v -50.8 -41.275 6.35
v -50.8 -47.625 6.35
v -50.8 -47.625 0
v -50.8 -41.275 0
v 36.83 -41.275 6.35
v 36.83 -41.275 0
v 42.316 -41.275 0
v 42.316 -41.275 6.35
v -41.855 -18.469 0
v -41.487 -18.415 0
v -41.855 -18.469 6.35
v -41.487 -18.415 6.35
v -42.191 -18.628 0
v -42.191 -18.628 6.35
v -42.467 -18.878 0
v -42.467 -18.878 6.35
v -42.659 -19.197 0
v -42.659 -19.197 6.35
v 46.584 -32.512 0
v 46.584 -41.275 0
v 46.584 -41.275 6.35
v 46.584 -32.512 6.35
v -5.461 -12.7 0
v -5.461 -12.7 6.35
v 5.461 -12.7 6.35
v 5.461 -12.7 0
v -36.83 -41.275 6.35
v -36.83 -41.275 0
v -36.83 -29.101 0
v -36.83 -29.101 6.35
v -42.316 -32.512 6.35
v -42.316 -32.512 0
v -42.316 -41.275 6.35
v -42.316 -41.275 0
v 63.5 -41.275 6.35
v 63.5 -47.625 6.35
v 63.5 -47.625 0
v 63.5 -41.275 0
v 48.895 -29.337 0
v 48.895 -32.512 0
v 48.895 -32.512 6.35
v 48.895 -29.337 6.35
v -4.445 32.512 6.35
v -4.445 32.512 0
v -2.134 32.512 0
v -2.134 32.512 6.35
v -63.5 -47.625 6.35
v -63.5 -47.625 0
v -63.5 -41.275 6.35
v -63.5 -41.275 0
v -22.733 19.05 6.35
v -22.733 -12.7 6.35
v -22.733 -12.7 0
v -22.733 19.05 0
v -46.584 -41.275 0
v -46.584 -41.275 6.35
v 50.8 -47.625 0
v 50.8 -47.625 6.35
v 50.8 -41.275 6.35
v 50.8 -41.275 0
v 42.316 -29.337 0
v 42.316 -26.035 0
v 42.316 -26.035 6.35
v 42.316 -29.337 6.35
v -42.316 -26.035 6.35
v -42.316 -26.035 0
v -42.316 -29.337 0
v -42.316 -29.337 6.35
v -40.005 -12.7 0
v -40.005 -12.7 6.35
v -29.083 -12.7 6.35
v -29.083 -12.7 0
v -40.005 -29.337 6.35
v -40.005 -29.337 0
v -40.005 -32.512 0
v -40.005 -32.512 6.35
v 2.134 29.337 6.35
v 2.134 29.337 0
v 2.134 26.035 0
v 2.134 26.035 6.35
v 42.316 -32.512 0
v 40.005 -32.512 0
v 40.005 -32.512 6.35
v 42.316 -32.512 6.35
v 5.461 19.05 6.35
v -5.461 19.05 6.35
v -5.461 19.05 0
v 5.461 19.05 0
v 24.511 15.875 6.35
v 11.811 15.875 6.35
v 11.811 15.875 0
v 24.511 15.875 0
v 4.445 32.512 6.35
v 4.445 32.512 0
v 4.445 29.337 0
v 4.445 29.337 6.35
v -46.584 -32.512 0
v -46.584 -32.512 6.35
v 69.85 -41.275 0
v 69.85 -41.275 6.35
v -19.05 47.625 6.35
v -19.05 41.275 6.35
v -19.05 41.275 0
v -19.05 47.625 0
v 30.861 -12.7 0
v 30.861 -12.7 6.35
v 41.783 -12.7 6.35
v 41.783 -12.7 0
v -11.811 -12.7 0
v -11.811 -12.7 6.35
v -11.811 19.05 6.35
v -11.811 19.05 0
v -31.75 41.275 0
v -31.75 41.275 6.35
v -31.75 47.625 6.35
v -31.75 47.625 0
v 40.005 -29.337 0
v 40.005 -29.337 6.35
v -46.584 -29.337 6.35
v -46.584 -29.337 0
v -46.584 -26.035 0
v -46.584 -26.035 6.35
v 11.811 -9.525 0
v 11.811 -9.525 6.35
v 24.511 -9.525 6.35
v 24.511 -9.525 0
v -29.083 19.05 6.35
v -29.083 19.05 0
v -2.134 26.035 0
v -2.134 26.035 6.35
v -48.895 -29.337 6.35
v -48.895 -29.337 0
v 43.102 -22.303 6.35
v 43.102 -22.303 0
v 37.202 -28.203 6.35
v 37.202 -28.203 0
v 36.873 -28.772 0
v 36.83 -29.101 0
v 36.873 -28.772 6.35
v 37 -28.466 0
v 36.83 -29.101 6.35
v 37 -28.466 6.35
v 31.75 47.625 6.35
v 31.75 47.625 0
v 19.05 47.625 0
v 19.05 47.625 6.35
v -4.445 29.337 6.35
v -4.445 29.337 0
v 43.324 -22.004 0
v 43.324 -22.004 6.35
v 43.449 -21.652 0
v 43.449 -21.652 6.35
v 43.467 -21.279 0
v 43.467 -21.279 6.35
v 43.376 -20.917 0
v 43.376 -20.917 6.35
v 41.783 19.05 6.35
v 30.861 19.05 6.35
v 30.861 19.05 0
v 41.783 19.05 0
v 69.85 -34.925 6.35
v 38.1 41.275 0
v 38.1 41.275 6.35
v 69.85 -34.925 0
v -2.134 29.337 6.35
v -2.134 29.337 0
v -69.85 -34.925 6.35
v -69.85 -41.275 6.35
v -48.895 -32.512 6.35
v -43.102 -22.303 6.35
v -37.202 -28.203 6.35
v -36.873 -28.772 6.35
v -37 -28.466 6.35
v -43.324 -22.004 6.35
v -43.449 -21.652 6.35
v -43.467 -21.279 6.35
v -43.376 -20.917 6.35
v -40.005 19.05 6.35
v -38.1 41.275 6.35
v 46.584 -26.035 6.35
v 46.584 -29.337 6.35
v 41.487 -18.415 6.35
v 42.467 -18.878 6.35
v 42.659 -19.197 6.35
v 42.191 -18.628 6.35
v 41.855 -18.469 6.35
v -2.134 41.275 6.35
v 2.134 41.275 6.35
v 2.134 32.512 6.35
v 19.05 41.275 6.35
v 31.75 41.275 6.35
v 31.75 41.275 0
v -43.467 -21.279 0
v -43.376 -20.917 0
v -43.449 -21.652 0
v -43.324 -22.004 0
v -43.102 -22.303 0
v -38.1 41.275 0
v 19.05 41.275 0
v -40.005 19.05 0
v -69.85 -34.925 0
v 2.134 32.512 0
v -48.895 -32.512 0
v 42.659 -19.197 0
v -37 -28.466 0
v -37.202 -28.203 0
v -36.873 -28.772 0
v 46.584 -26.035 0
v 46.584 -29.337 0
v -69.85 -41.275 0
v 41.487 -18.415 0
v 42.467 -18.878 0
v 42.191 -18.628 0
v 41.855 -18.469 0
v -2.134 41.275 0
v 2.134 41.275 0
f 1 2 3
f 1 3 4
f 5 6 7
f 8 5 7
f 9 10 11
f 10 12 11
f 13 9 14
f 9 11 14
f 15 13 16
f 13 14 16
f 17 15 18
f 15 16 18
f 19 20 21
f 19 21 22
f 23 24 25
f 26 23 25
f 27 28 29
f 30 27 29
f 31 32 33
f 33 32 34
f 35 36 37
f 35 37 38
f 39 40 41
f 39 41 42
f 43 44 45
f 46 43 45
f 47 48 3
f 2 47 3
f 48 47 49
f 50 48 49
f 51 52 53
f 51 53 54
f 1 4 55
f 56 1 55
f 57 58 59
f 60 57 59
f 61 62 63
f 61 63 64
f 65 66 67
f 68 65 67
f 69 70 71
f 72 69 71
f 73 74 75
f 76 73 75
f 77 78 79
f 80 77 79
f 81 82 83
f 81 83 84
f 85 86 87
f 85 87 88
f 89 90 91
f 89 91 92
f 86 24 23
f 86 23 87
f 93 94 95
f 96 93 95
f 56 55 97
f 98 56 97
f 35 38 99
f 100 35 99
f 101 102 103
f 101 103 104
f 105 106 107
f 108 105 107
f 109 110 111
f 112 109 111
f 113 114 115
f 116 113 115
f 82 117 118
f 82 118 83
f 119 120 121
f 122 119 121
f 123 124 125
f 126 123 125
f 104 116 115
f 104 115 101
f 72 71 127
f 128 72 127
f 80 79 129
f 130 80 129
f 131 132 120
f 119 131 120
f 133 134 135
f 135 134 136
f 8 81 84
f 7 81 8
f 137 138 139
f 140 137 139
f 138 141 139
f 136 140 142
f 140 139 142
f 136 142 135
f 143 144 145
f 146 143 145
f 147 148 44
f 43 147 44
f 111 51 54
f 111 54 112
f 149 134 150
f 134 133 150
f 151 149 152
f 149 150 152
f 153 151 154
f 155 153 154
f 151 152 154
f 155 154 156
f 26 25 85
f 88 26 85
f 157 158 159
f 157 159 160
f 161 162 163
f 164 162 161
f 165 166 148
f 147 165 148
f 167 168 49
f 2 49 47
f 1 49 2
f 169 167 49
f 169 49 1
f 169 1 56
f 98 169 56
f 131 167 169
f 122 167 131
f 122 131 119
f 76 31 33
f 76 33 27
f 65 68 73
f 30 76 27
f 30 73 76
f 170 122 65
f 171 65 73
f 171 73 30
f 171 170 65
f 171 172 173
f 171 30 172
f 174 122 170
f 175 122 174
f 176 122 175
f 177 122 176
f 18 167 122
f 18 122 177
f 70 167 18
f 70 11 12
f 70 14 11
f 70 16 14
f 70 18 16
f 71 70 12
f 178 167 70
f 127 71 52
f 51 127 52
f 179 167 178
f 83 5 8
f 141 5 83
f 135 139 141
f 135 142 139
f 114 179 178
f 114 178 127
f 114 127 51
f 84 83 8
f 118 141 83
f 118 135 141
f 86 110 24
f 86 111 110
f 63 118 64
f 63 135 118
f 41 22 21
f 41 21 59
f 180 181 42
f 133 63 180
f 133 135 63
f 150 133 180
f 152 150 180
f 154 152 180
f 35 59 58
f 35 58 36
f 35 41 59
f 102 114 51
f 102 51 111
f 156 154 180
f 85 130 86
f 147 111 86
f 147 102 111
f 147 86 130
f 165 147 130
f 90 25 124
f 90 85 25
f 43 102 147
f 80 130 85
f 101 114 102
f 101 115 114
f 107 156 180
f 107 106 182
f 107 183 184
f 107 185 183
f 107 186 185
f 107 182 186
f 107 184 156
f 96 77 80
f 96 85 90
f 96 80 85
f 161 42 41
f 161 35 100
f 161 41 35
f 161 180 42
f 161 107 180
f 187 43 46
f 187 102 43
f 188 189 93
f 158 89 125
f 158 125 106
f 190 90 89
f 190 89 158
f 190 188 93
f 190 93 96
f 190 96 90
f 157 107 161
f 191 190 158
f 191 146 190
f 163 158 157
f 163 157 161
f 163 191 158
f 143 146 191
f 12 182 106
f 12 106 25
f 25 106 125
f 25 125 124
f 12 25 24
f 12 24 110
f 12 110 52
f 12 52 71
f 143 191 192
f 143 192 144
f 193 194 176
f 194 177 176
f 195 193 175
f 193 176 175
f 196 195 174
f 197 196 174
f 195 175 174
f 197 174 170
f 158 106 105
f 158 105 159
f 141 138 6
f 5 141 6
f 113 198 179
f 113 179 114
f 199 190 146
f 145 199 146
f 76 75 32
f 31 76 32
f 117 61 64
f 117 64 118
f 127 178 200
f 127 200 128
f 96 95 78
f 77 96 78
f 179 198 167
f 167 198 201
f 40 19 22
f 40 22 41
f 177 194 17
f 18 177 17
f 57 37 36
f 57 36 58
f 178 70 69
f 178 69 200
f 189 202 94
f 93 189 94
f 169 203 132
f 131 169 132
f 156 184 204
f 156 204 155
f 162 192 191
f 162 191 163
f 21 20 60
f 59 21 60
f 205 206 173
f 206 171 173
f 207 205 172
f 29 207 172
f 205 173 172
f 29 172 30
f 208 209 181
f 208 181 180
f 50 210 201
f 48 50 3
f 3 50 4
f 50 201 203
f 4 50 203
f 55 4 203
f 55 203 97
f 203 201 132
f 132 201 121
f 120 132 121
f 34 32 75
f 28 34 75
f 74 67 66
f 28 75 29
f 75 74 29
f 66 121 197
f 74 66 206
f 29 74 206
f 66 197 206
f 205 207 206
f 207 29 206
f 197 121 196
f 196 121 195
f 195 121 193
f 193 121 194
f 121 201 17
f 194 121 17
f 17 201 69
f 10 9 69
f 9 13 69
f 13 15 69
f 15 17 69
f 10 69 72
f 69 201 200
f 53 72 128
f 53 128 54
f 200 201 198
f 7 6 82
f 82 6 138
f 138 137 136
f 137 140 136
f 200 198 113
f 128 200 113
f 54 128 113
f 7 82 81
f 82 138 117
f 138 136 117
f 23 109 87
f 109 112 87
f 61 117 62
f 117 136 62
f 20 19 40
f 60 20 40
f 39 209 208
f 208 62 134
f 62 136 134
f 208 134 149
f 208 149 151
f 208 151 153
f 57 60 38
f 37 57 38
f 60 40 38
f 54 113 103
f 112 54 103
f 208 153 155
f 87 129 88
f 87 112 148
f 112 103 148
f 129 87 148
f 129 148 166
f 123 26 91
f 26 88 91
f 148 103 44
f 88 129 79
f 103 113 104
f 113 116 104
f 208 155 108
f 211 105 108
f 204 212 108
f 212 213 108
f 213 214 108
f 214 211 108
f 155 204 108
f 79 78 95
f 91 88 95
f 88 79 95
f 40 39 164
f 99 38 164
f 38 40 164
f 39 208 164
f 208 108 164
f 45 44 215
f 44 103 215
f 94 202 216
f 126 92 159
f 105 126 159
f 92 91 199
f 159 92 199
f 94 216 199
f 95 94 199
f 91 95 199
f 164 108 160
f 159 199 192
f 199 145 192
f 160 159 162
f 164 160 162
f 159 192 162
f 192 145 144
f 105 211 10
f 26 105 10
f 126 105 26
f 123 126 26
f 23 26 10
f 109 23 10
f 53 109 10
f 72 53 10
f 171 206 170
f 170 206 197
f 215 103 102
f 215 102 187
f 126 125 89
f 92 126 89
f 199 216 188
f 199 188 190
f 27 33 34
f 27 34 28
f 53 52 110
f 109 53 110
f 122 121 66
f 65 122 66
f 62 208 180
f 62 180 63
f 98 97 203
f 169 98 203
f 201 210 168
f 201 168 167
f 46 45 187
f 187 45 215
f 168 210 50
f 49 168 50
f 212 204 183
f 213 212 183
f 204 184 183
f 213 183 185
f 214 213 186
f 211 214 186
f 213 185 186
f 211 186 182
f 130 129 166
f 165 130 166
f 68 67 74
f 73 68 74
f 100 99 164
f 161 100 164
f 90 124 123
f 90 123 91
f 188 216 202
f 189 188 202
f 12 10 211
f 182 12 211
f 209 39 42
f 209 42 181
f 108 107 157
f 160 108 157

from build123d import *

# Parameters (mm, degrees)
SKETCH1_W               = 139.7
SKETCH1_H               = 82.55
BOSS_EXTRUDE1_DEPTH     = 6.35
SKETCH2_W               = 12.7
SKETCH2_H               = 6.35
BOSS_EXTRUDE2_DEPTH     = 6.35
CUT_EXTRUDE1_DEPTH      = 6.35
CUT_EXTRUDE8_DEPTH      = 6.35
CUT_EXTRUDE2_DEPTH      = 6.35
CUT_EXTRUDE9_DEPTH      = 85.77904001
CUT_EXTRUDE9_DEPTH_BACK = 85.77904001
FILLET1_R               = 1.27
SKETCH9_W               = 10.922
SKETCH9_H               = 31.75
SKETCH9_W_2             = 12.7
SKETCH9_H_2             = 25.4
CUT_EXTRUDE10_DEPTH     = 6.35


with BuildPart() as part:
    # Sketch1 → Boss-Extrude1 (new body)
    with BuildSketch(Plane.XY):
        Rectangle(SKETCH1_W, SKETCH1_H)
    extrude(amount=BOSS_EXTRUDE1_DEPTH)

    # Sketch2 → Boss-Extrude2 (add)
    with BuildSketch(Plane(origin=(0, 0, 0), x_dir=(-1, 0, 0), z_dir=(0, 0, -1))):
        with Locations((-57.15, -44.45)):
            Rectangle(SKETCH2_W, SKETCH2_H)
        with Locations((-25.4, 44.45)):
            Rectangle(SKETCH2_W, SKETCH2_H)
    boss_extrude2 = extrude(amount=-BOSS_EXTRUDE2_DEPTH)

    # Sketch3 → Cut-Extrude1 (cut)
    with BuildSketch(Plane(origin=(0, 0, 0), x_dir=(-1, 0, 0), z_dir=(0, 0, -1))):
        Polygon((-46.5836, -41.275), (-46.5836, -32.512), (-48.895, -32.512), (-48.895, -29.337), (-46.5836, -29.337), (-46.5836, -26.035), (-42.3164, -26.035), (-42.3164, -29.337), (-40.005, -29.337), (-40.005, -32.512), (-42.3164, -32.512), (-42.3164, -41.275), align=None)
    cut_extrude1 = extrude(amount=-CUT_EXTRUDE1_DEPTH, mode=Mode.SUBTRACT)

    # Sketch7 → Cut-Extrude8 (cut)
    with BuildSketch(Plane(origin=(0, 0, 0), x_dir=(-1, 0, 0), z_dir=(0, 0, -1))):
        Polygon((-38.1, 41.275), (-69.85, -34.925), (-69.85, 41.275), align=None)
    cut_extrude8 = extrude(amount=-CUT_EXTRUDE8_DEPTH, mode=Mode.SUBTRACT)

    # Mirror2: Boss-Extrude2, Cut-Extrude8 across plane
    add(boss_extrude2.mirror(Plane(origin=(0, 0, 0), x_dir=(0, 0, 1), z_dir=(1, 0, 0))))
    add(cut_extrude8.mirror(Plane(origin=(0, 0, 0), x_dir=(0, 0, 1), z_dir=(1, 0, 0))), mode=Mode.SUBTRACT)

    # Mirror4: Cut-Extrude1 across plane
    add(cut_extrude1.mirror(Plane(origin=(0, 0, 0), x_dir=(0, 0, 1), z_dir=(1, 0, 0))), mode=Mode.SUBTRACT)

    # Sketch4 → Cut-Extrude2 (cut)
    with BuildSketch(Plane(origin=(0, 0, 0), x_dir=(-1, 0, 0), z_dir=(0, 0, -1))):
        Polygon((2.1336, 41.275), (-2.1336, 41.275), (-2.1336, 32.512), (-4.445, 32.512), (-4.445, 29.337), (-2.1336, 29.337), (-2.1336, 26.035), (2.1336, 26.035), (2.1336, 29.337), (4.445, 29.337), (4.445, 32.512), (2.1336, 32.512), align=None)
    extrude(amount=-CUT_EXTRUDE2_DEPTH, mode=Mode.SUBTRACT)

    # Sketch8 → Cut-Extrude9 (cut, two sides: drawn at the far end of the back side and taken through both)
    with BuildSketch(Plane.XY.offset(6.35).offset(-CUT_EXTRUDE9_DEPTH_BACK)):
        Polygon((-36.83, -28.575), (-43.702941176, -21.702058824), (-42.333333333, -18.415), (42.333333333, -18.415), (43.702941176, -21.702058824), (36.83, -28.575), (36.83, -41.275), (-36.83, -41.275), align=None)
    extrude(amount=CUT_EXTRUDE9_DEPTH + CUT_EXTRUDE9_DEPTH_BACK, mode=Mode.SUBTRACT)

    # Fillet1
    fillet1_edges = [part.edges().sort_by_distance(p)[0] for p in [
        (-36.83, -28.575, 3.175),
        (-43.702941176, -21.702058824, 3.175),
        (-42.333333333, -18.415, 3.175),
        (42.333333333, -18.415, 3.175),
        (43.702941176, -21.702058824, 3.175),
        (36.83, -28.575, 3.175),
    ]]
    fillet(fillet1_edges, radius=FILLET1_R)

    # Sketch9 → Cut-Extrude10 (cut)
    with BuildSketch(Plane.XY.offset(6.35)):
        with Locations((0, 3.175)):
            Rectangle(SKETCH9_W, SKETCH9_H)
        with Locations((-34.544, 3.175)):
            Rectangle(SKETCH9_W, SKETCH9_H)
        with Locations((-17.272, 3.175)):
            Rectangle(SKETCH9_W, SKETCH9_H)
        with Locations((36.322, 3.175)):
            Rectangle(SKETCH9_W, SKETCH9_H)
        with Locations((18.161, 3.175)):
            Rectangle(SKETCH9_W_2, SKETCH9_H_2)
    extrude(amount=-CUT_EXTRUDE10_DEPTH, mode=Mode.SUBTRACT)


solid = part.part
